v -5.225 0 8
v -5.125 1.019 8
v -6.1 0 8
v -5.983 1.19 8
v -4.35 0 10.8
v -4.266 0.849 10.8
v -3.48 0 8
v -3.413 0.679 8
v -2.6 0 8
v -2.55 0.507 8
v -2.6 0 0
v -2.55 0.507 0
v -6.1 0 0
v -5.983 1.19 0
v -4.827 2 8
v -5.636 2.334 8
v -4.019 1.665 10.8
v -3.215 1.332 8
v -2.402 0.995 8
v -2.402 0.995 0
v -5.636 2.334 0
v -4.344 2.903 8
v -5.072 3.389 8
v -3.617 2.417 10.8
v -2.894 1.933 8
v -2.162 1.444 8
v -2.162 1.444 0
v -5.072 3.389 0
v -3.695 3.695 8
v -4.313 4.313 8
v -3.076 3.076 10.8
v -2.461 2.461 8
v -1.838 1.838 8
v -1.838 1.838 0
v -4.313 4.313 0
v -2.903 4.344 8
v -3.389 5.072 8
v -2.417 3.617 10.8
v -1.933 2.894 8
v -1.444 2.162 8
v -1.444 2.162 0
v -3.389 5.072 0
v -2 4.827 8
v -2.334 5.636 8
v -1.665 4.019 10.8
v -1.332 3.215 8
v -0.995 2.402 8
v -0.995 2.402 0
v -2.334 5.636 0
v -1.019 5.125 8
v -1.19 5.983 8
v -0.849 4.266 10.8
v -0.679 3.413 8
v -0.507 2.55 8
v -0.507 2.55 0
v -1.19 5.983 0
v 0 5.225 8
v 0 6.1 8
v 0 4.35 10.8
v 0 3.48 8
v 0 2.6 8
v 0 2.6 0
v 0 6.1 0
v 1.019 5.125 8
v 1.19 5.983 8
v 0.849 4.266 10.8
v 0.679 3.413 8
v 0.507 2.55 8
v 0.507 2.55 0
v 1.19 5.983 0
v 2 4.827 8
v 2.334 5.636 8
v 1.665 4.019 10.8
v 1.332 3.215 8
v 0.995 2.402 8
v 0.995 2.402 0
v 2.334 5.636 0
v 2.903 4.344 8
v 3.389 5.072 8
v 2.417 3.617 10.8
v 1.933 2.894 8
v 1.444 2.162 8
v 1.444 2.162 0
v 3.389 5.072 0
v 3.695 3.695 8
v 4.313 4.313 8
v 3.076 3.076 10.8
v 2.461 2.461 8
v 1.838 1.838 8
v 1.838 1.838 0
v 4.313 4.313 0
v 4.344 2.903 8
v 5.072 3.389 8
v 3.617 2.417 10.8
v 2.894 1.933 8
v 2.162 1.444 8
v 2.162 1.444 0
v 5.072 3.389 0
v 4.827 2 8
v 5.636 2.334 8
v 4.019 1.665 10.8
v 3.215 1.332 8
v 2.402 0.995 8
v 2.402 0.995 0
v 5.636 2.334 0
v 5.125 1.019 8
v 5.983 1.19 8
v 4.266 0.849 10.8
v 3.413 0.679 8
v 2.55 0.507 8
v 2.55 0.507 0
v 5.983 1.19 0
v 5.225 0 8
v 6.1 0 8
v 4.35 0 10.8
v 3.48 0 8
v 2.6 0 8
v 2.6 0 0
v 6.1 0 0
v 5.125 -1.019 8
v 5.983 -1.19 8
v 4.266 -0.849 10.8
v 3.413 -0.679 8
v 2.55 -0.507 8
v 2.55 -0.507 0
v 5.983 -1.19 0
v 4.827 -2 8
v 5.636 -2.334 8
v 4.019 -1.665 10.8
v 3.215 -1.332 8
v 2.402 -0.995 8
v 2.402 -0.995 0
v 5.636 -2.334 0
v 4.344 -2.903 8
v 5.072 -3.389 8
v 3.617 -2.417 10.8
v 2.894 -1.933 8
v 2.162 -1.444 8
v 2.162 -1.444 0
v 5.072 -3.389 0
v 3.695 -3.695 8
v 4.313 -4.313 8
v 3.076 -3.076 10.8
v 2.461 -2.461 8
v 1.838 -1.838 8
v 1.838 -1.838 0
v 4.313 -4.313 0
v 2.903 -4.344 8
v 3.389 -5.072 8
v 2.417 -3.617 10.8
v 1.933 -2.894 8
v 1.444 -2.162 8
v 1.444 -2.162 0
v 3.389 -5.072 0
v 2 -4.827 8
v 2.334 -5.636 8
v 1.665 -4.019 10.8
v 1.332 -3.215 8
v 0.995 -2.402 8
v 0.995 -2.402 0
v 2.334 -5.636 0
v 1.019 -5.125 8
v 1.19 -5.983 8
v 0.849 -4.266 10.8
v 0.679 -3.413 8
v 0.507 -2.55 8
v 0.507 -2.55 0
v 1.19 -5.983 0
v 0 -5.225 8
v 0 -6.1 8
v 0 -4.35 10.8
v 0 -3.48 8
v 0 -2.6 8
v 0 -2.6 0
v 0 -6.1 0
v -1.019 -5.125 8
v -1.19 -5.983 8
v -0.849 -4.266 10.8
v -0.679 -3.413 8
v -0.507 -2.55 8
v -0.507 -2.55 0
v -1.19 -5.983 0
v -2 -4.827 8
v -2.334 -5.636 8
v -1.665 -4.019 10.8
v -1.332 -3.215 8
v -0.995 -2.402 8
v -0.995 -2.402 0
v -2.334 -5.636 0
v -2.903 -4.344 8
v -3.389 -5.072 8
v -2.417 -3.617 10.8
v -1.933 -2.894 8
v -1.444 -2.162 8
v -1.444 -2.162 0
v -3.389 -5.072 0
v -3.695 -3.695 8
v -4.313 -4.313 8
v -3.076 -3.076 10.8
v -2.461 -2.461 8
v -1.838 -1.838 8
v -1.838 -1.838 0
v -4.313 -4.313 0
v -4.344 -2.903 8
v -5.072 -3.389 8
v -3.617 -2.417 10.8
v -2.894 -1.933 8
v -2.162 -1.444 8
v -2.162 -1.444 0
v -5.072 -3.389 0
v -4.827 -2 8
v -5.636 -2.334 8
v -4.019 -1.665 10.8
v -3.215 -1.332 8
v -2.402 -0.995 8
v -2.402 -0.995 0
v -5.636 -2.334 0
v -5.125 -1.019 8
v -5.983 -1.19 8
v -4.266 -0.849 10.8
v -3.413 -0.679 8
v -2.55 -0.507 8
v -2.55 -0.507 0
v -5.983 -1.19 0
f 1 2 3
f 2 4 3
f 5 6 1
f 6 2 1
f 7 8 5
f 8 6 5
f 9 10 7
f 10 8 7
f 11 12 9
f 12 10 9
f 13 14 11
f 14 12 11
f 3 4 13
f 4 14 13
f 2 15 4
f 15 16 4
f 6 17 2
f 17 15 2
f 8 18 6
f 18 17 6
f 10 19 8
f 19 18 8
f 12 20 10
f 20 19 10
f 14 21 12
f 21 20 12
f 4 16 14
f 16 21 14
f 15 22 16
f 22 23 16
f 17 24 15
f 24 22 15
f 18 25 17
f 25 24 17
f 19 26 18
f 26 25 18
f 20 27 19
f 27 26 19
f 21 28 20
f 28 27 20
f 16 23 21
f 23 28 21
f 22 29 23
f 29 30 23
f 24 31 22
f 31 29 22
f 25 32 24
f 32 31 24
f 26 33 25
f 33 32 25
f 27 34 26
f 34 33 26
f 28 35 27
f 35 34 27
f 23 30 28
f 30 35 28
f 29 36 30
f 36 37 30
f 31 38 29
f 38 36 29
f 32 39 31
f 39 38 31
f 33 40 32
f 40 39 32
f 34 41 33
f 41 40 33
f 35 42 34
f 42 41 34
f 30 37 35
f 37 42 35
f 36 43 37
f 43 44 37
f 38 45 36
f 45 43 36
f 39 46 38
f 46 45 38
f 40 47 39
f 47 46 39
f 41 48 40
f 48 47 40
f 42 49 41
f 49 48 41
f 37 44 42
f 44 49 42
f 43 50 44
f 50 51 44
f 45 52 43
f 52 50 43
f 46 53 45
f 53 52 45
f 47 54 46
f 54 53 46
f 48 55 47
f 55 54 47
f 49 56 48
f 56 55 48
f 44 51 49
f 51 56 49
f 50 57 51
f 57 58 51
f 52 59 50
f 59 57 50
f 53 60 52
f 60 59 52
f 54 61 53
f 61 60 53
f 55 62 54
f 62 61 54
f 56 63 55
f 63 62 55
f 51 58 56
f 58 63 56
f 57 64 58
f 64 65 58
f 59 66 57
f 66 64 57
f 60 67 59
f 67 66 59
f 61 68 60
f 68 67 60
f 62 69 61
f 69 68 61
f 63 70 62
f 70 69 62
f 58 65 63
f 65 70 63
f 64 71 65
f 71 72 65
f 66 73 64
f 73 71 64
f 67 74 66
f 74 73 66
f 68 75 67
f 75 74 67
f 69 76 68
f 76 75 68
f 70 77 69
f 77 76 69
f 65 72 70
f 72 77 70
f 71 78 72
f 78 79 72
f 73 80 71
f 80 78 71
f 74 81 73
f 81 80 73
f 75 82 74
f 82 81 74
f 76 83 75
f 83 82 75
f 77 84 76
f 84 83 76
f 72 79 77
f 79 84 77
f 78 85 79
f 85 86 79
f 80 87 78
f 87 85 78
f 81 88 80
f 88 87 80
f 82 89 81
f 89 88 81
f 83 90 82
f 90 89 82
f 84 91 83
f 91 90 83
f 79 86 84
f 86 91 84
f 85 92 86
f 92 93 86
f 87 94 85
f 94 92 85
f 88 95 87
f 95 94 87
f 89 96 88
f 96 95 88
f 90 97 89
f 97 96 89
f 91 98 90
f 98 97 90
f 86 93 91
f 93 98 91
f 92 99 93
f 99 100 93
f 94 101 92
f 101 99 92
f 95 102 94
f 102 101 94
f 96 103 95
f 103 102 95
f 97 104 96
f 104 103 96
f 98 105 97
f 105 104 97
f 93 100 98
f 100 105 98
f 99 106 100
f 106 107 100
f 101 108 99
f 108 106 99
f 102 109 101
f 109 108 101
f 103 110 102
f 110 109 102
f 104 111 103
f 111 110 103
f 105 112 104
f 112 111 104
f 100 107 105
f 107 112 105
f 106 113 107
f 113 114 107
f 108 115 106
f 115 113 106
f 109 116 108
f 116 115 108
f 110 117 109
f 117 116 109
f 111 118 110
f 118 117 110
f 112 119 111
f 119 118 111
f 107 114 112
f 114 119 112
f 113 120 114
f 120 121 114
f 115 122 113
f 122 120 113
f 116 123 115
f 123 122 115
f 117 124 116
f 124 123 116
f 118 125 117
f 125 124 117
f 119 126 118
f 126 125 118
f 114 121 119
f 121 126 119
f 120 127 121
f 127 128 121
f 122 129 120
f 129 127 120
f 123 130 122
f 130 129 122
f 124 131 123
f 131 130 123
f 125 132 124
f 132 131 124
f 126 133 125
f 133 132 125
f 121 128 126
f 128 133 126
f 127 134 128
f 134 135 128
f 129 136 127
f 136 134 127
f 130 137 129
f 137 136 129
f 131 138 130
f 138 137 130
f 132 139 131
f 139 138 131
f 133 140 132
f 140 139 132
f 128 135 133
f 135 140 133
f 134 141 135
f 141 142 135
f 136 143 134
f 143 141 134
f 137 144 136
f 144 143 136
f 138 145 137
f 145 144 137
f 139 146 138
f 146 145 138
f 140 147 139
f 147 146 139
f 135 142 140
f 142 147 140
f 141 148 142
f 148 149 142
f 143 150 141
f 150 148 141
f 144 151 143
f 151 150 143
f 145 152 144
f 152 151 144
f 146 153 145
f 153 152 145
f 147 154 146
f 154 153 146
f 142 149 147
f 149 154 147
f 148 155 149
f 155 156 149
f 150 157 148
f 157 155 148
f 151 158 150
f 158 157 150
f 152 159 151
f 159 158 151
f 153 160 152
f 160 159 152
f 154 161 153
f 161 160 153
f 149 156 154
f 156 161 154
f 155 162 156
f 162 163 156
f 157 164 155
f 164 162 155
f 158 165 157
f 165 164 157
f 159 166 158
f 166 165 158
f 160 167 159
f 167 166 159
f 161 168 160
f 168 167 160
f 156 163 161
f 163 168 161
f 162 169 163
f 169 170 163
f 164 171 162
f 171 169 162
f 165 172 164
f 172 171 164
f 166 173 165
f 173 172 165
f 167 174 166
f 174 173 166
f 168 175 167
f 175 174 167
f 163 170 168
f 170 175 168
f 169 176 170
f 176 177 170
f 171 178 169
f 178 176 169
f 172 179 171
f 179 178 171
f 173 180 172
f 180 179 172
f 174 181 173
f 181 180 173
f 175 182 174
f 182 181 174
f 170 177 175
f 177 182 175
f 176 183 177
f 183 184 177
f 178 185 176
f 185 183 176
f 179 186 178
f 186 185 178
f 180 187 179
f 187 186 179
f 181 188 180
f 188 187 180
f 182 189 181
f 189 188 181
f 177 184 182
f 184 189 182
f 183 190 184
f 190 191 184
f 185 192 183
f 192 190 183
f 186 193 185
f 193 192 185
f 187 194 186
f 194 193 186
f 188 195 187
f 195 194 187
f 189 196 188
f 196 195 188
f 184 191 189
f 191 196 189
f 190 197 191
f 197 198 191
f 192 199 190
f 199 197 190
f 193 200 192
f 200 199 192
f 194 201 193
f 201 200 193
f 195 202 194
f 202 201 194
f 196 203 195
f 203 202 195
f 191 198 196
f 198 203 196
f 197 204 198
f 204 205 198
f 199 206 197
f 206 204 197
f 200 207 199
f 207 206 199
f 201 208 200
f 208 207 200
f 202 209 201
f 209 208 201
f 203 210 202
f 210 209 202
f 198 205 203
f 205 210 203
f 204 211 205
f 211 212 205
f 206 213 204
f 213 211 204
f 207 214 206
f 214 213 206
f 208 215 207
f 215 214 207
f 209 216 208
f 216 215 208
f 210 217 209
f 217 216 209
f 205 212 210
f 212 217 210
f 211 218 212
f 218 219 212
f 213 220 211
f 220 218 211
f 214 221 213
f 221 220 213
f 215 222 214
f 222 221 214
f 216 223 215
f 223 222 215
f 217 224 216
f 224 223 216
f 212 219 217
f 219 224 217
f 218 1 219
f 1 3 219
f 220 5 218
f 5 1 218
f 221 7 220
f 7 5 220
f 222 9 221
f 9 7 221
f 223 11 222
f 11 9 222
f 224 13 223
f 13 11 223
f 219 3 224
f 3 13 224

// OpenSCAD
$fn = 32;

// ----------------------------------------------------------------------
// Form washer: domed washer, 12.2 mm outside, 5.2 mm bore
// ----------------------------------------------------------------------

// --- parameters (mm) ---
revolve_angle = 360;      // full turn around the Z axis
profile_points = 7;       // points of the closed outline

profile = [[2.6, 0], [6.1, 0], [6.1, 8], [5.225, 8], [4.35, 10.8], [3.48, 8], [2.6, 8]];  // single closed polygon, 7 points, counter clockwise

// --- the one profile operation ---
rotate_extrude(angle = revolve_angle) polygon(points = profile);
